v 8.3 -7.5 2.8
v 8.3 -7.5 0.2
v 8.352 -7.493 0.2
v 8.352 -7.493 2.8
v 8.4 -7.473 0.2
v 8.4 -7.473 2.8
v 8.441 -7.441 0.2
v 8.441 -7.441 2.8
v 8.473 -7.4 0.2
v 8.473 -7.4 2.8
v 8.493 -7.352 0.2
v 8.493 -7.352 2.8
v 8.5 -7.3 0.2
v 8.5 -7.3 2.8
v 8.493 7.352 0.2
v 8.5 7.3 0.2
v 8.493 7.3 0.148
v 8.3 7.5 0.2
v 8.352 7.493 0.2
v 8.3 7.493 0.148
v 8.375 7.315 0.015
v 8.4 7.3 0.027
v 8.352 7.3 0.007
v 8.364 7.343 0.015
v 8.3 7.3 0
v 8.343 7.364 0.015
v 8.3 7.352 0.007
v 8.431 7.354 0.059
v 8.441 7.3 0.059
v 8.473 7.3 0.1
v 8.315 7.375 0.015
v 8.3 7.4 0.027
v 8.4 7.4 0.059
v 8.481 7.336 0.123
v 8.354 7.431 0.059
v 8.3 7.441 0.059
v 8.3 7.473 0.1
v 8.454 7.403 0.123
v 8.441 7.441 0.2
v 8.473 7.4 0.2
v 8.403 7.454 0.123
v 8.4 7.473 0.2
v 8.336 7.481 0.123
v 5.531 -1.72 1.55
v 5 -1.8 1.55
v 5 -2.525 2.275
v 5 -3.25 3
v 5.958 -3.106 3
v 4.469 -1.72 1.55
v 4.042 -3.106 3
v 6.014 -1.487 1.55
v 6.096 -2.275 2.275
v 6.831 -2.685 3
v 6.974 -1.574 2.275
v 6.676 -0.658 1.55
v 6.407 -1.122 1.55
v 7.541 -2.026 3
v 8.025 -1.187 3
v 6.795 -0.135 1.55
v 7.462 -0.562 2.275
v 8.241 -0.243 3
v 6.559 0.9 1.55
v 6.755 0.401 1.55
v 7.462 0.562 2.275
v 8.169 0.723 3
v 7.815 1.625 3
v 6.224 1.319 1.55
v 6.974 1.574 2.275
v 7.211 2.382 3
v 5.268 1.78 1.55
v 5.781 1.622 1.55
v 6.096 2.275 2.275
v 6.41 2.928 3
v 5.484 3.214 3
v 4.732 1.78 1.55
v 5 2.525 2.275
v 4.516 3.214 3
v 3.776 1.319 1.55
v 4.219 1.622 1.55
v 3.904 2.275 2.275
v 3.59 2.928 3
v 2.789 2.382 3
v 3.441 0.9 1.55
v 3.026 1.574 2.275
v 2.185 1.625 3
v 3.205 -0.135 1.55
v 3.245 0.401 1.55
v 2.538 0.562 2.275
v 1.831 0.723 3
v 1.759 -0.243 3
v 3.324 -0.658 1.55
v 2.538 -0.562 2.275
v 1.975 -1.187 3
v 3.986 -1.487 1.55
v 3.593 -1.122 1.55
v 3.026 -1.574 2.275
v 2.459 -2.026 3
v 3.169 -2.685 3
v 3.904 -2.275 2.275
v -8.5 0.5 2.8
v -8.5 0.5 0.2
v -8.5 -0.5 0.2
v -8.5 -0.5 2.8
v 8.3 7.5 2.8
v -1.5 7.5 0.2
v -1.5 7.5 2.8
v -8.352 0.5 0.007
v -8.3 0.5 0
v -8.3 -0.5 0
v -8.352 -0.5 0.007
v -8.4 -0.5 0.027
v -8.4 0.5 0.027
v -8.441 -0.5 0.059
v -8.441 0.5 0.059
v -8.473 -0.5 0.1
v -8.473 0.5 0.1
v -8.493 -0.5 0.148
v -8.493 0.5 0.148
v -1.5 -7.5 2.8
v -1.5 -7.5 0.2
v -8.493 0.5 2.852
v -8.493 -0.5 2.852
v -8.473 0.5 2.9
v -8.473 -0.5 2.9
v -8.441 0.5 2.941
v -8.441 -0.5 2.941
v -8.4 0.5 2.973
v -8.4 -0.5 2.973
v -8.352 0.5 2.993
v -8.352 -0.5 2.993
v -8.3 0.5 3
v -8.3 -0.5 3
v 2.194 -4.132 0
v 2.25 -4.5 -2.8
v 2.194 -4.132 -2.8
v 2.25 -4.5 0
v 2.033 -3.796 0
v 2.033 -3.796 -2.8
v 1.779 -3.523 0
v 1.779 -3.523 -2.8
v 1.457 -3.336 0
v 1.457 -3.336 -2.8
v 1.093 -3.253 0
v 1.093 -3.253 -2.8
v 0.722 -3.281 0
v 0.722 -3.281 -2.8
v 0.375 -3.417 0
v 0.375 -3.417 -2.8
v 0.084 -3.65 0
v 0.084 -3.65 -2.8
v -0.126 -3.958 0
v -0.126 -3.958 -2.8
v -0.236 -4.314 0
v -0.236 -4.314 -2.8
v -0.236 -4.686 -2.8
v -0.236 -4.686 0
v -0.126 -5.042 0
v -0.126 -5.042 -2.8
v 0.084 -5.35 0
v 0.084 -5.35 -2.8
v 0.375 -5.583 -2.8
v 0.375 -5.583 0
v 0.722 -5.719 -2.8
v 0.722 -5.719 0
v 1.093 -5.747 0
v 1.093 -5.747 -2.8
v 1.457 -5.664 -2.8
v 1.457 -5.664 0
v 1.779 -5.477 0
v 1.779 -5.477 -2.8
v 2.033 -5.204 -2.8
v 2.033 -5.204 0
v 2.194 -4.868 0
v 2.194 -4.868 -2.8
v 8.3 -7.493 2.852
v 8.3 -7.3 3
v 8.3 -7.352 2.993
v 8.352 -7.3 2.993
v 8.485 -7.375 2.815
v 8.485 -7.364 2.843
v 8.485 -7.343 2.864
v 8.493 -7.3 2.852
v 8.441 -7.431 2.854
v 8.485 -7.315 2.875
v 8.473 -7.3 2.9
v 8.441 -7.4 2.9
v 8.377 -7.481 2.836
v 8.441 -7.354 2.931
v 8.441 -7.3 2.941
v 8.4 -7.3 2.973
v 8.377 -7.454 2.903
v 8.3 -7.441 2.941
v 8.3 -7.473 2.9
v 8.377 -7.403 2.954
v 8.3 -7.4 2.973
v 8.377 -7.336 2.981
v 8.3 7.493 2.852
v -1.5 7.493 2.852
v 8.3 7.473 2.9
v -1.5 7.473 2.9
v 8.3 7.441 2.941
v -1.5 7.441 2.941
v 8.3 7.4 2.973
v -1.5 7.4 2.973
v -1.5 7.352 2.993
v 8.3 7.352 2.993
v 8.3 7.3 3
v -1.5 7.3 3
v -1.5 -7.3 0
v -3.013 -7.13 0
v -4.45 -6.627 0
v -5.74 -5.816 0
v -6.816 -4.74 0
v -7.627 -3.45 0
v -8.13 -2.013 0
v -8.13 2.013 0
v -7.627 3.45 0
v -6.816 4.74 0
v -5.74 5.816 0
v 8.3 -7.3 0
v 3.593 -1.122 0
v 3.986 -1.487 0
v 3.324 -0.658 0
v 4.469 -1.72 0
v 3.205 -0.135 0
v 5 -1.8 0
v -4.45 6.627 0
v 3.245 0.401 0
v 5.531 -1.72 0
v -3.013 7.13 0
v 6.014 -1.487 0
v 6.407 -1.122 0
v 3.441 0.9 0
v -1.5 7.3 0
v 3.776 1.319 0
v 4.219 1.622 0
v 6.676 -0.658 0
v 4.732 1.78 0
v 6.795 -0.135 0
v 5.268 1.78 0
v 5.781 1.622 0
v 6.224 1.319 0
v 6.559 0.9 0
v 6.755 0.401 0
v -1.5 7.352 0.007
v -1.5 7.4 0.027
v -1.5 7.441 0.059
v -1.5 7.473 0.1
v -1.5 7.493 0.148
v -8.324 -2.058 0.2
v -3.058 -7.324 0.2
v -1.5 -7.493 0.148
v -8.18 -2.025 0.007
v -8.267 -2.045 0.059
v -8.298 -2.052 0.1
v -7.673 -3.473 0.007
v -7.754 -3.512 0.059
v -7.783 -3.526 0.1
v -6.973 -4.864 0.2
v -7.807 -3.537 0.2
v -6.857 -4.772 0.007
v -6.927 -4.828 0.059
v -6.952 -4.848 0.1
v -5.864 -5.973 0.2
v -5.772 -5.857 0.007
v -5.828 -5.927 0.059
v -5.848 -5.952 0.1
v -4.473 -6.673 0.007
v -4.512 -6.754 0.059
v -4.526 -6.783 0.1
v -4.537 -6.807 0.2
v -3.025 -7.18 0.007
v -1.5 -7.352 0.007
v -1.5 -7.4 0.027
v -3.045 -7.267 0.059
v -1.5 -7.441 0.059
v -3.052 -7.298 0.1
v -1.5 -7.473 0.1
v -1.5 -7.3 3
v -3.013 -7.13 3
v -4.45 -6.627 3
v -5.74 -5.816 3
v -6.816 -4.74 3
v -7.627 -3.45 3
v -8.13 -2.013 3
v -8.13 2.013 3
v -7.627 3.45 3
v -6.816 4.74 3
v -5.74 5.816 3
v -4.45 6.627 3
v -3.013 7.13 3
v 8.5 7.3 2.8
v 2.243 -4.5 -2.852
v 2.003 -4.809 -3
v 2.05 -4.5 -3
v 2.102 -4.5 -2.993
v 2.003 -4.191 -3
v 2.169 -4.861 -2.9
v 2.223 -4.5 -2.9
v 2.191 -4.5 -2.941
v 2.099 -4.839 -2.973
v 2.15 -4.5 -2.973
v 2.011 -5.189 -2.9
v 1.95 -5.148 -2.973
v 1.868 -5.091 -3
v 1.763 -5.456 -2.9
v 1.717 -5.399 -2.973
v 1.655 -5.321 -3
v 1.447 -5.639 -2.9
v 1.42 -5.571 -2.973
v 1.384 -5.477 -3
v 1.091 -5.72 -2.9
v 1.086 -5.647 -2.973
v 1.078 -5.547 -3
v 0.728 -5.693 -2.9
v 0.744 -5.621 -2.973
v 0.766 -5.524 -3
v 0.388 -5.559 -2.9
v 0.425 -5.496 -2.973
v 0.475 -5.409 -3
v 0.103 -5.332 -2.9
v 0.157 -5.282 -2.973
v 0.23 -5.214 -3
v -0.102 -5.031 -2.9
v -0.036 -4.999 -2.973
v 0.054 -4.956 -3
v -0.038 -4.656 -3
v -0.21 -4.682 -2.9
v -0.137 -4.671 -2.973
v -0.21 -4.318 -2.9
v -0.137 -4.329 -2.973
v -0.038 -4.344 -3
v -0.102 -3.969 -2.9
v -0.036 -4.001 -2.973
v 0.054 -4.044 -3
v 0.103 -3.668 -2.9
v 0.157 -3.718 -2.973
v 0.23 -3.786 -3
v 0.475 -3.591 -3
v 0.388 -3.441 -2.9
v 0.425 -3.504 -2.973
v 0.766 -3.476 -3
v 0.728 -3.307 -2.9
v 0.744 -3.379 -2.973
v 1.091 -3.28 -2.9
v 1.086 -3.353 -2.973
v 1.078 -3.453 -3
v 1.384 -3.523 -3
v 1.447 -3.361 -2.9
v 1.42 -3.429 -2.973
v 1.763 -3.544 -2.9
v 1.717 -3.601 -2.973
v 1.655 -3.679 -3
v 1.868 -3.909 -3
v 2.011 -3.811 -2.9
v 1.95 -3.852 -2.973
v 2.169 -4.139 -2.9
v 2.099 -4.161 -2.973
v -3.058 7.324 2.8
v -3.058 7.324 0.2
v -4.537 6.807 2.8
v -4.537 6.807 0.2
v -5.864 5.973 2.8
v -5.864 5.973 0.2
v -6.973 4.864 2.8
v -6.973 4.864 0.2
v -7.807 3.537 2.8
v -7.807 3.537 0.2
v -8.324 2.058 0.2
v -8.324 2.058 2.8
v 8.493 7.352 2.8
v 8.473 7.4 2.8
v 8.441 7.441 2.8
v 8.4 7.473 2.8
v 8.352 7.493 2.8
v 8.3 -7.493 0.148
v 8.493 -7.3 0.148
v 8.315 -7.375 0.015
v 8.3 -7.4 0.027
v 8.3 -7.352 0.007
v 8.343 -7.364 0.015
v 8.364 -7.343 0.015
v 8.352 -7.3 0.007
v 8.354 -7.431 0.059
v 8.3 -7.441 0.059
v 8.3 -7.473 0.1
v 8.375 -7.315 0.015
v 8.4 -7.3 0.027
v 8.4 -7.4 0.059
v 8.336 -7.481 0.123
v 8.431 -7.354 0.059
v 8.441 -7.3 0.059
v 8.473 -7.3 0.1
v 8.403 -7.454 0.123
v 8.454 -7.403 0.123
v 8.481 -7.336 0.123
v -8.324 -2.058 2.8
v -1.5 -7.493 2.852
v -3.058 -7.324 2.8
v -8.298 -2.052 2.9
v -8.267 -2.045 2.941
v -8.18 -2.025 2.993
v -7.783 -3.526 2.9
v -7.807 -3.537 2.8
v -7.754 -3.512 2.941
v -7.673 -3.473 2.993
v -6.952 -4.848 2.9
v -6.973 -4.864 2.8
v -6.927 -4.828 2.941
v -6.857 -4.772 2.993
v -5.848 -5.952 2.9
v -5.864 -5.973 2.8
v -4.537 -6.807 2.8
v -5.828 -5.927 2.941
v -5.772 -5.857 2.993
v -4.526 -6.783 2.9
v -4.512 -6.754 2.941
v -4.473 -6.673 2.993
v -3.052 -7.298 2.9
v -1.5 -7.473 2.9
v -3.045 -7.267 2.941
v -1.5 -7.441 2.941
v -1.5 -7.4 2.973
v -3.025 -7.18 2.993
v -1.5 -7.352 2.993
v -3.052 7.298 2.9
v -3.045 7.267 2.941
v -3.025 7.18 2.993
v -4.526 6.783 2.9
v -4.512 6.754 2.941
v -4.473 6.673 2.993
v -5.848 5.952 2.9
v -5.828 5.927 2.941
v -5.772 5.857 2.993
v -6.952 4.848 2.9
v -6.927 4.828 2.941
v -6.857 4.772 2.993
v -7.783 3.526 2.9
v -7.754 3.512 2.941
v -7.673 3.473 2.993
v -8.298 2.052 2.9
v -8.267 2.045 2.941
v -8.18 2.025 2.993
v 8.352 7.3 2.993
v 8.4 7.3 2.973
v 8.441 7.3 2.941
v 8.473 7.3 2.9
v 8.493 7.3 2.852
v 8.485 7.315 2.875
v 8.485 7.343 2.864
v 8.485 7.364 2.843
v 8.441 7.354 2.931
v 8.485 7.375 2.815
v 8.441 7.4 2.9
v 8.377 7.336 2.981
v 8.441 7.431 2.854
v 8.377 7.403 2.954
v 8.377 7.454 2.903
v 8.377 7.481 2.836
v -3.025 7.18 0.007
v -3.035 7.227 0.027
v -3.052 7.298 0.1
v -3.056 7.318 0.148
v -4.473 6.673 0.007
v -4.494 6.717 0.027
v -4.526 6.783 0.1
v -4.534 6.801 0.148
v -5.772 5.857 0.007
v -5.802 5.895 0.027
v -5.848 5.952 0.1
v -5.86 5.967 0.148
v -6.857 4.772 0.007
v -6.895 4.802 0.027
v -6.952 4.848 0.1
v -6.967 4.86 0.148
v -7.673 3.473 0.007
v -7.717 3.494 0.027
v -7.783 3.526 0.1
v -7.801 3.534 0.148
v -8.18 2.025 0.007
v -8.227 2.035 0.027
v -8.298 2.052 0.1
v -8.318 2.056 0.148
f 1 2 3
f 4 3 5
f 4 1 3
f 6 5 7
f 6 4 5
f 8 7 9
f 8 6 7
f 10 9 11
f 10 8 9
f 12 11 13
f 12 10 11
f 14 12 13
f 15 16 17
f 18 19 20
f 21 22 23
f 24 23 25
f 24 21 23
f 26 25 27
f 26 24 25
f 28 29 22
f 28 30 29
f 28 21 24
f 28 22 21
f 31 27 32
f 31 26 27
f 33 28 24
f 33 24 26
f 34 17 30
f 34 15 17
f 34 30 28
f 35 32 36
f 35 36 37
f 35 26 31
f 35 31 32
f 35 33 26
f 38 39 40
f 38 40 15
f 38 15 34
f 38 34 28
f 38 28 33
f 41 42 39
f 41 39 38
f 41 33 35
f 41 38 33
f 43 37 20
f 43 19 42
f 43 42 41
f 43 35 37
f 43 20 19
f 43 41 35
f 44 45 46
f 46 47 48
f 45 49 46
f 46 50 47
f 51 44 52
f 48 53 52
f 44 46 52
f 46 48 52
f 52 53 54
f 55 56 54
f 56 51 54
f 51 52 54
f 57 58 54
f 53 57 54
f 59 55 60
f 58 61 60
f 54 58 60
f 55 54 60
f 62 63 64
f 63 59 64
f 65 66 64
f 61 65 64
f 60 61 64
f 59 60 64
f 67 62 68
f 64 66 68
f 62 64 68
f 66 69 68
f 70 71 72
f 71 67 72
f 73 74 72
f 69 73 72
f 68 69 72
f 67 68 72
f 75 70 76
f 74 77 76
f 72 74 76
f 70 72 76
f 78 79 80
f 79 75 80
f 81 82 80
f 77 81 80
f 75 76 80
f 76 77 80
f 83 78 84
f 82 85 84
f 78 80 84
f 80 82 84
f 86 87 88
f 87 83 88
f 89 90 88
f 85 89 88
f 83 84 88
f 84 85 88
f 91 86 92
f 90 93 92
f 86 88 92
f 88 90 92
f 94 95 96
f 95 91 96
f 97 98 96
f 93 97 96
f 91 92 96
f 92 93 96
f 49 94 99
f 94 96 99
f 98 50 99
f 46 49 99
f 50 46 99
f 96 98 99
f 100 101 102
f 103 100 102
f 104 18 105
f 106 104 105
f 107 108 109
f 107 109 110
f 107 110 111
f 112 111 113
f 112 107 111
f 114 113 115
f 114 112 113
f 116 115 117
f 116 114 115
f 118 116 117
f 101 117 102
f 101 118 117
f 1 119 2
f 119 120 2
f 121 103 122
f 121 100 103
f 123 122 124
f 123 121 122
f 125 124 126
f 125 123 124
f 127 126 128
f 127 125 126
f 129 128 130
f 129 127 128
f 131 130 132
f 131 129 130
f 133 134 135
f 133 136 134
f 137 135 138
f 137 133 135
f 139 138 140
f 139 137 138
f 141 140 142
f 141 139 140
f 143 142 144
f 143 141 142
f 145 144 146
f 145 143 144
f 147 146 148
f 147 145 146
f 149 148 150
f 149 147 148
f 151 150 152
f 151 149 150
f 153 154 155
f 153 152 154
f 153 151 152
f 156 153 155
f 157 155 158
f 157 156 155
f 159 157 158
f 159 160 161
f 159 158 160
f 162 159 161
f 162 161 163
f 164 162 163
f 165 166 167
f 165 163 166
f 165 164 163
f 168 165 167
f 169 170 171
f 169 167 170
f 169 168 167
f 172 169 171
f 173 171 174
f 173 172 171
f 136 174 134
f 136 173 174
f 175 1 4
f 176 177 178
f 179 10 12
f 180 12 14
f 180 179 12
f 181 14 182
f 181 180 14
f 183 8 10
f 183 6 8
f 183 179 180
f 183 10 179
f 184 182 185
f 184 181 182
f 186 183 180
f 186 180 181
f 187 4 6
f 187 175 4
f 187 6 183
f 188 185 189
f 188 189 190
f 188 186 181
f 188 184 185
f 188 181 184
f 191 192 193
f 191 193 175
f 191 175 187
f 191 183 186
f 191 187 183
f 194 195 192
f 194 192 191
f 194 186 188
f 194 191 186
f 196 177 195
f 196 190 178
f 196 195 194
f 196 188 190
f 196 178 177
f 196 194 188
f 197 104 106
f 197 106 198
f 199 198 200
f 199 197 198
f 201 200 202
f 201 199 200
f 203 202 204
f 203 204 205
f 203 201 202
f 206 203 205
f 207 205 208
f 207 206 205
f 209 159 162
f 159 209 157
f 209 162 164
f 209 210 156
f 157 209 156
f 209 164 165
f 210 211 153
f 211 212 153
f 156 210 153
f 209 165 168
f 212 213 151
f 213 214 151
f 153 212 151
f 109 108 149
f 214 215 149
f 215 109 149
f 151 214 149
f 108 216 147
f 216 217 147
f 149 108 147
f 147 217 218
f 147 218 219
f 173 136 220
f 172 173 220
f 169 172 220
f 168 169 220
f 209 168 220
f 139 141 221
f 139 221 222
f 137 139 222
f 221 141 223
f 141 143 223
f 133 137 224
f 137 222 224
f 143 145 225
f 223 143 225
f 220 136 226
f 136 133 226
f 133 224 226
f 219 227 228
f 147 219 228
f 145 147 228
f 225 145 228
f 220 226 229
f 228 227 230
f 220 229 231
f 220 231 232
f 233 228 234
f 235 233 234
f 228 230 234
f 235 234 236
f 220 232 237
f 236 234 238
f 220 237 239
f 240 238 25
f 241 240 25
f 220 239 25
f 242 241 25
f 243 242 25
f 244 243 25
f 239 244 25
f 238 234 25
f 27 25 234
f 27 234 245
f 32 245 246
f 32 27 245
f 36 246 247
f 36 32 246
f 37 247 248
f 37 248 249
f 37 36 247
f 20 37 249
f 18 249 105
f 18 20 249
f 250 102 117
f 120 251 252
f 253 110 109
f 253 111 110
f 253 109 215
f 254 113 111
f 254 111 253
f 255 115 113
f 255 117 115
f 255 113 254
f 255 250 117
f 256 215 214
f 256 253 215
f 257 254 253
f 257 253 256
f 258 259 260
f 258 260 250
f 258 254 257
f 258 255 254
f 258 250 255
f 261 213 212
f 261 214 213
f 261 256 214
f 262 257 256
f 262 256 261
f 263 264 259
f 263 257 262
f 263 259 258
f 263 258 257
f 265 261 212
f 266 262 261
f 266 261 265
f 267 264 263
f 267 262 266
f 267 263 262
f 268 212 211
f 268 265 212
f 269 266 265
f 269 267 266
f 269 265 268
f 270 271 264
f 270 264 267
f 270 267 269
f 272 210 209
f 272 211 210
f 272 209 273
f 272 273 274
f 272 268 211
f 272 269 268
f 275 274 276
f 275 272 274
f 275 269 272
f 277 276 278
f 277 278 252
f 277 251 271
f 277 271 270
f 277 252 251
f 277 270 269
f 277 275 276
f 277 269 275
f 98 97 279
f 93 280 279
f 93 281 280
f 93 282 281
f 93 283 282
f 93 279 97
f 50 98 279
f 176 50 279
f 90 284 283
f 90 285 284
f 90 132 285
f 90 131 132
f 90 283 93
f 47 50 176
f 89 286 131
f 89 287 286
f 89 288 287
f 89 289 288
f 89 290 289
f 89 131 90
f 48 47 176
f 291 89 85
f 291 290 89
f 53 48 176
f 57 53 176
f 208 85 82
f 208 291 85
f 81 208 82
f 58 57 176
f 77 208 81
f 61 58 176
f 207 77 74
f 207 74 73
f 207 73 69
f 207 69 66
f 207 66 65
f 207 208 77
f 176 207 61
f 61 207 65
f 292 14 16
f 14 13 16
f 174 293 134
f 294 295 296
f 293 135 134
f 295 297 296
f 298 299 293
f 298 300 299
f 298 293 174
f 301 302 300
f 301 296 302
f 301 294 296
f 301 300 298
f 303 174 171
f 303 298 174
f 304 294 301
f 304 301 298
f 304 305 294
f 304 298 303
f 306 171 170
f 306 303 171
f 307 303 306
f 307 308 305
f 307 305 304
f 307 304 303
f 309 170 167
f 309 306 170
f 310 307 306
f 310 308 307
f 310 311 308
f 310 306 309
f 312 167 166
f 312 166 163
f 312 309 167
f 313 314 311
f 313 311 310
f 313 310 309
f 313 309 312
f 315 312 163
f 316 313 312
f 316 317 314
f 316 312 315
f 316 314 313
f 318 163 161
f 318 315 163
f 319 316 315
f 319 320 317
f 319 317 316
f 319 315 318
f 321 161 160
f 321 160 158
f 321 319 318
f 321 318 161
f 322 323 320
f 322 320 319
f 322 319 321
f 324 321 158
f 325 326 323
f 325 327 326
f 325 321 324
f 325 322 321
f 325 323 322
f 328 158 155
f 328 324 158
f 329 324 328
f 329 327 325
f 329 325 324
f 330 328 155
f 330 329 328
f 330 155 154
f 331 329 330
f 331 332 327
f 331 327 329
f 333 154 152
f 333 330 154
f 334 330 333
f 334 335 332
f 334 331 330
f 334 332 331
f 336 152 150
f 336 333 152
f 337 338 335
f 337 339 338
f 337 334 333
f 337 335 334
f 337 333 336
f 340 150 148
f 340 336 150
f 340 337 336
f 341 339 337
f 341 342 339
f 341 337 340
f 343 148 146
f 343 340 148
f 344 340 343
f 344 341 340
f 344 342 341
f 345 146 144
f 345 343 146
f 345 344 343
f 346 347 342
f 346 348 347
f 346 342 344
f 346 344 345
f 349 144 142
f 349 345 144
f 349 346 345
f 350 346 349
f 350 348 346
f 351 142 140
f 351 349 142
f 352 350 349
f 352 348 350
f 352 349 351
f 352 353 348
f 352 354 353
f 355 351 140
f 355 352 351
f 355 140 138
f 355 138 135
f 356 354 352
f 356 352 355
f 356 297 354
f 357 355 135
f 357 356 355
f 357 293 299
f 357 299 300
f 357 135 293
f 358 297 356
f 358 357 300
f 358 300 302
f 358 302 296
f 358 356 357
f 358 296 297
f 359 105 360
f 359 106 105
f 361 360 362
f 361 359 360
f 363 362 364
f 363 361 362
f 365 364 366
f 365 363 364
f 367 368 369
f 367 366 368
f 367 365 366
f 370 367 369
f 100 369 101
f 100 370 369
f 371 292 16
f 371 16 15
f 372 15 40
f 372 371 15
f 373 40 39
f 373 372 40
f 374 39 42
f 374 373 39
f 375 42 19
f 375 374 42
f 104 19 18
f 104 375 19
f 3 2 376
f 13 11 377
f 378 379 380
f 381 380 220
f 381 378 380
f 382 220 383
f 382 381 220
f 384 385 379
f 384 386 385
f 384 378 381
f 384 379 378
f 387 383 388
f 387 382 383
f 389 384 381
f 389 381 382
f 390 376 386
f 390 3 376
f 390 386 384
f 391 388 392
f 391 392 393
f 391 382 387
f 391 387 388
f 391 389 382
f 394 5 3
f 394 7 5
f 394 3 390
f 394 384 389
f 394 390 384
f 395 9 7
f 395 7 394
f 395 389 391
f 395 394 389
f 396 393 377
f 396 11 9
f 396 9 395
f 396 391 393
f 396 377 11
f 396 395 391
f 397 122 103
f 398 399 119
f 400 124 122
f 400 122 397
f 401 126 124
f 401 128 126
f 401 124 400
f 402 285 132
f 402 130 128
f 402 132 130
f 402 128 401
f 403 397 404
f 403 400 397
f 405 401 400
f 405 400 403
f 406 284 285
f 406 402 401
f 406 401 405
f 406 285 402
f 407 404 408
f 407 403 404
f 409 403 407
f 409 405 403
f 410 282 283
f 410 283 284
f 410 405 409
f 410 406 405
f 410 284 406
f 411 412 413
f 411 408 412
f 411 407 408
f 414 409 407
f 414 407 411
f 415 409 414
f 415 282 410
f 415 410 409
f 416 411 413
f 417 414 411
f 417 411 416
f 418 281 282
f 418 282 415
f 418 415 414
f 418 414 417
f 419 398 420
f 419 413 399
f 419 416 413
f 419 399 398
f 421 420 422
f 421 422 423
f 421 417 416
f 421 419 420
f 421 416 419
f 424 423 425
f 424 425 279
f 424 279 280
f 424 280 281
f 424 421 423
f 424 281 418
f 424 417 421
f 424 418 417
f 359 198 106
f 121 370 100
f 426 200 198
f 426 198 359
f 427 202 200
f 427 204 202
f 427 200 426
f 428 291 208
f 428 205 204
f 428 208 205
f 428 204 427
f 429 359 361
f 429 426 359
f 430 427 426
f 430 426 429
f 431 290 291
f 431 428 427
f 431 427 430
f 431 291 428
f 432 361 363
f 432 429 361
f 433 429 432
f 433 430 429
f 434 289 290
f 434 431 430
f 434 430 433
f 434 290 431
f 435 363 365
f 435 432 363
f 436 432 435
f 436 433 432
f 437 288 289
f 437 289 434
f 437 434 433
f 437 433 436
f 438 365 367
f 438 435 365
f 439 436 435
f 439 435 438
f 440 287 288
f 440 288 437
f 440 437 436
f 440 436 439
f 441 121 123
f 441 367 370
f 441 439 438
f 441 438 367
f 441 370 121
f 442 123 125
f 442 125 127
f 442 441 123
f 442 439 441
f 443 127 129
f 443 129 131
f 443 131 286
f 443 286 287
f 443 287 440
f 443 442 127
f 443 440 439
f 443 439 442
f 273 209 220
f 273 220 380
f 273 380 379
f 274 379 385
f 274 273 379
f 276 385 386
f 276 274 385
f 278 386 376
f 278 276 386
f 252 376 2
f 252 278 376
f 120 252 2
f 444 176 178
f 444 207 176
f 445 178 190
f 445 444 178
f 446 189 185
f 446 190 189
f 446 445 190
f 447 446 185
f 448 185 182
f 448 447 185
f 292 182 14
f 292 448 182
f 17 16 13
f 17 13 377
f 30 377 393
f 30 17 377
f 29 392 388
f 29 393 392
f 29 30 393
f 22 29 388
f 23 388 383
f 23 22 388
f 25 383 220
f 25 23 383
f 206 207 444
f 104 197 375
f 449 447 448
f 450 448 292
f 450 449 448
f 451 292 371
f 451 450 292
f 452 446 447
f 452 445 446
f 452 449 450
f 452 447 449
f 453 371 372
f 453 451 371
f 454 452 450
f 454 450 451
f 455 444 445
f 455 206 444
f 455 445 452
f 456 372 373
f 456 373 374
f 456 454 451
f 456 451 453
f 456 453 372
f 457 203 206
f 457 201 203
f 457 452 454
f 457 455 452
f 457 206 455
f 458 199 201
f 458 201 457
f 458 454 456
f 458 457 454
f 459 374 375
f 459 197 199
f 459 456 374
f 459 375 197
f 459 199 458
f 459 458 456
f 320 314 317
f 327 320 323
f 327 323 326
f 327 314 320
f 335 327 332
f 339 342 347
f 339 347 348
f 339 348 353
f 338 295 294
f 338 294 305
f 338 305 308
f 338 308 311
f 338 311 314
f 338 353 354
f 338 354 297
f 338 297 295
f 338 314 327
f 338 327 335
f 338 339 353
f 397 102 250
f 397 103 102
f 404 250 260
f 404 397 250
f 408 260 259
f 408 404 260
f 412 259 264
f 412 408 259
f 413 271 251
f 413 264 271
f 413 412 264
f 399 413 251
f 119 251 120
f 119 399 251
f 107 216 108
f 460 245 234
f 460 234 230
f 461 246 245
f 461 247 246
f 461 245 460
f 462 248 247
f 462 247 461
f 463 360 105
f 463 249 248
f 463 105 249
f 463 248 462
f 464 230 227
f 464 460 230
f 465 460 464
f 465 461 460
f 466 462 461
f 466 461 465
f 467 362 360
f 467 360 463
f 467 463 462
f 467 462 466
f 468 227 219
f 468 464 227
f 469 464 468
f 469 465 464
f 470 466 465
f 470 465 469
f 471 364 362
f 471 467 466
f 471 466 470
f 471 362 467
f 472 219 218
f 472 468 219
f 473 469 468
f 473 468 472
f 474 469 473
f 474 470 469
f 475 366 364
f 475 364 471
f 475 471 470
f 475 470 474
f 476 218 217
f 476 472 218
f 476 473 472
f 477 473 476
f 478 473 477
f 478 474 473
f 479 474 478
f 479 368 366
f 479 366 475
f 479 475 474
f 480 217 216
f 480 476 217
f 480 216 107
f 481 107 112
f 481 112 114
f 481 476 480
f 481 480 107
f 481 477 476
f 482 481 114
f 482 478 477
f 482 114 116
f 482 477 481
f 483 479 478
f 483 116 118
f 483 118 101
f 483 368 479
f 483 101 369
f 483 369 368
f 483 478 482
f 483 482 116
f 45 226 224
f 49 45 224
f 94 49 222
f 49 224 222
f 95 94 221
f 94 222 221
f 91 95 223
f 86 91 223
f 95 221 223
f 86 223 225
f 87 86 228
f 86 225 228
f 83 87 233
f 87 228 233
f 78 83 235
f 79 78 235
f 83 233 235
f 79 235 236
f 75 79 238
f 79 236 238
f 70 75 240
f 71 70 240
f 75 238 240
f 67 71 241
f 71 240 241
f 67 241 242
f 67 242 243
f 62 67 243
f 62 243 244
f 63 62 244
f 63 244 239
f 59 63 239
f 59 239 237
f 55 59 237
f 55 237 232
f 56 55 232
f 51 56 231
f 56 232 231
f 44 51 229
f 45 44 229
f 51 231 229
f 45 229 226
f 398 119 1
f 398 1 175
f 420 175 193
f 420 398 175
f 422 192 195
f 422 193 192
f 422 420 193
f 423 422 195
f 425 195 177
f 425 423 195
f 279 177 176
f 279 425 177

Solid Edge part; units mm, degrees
sketch "Sketch1" plane through (0, 0, 0) normal (0, 0, 1) x (1, 0, 0)
  line L0 (-8.5, -7.5) -> (8.5, -7.5)
  line L1 (8.5, -7.5) -> (8.5, 7.5)
  line L2 (8.5, 7.5) -> (-8.5, 7.5)
  line L3 (-8.5, 7.5) -> (-8.5, -7.5)
  dimension "D1" = 17
  dimension "D2" = 15
extrude "Protrusion1" add sketch "Sketch1" along normal blind 3
fillet "Verrundung_1" radius 7 2 edges at (-8.5, -7.5, 1.5) (-8.5, 7.5, 1.5)
hole "Bohrung_1" at (5, 0, 3) direction (0, 0, -1) diameter 3.6 depth 3 countersink diameter 6.5 countersink angle 90
sketch "Sketch2" plane through (0, 0, 0) normal (0, 0, -1) x (1, 0, 0)
  circle A0 centre (1, 4.5) radius 1.25
  dimension "D1" = 2.5
  dimension "D2" = 4
  dimension "D3" = 12
extrude "v_3" add sketch "Sketch2" along normal blind 3
fillet "Verrundung_2" radius 0.2 1 edges at (-0.25, -4.5, -3)
fillet "Verrundung_3" radius 0.2 14 edges at (-6.4497, -5.4497, 3) (3.5, -7.5, 3) (-8.5, 0, 3) (-6.4497, 5.4497, 3) (3.5, 7.5, 3) (8.5, 0, 3) (8.5, -7.5, 1.5) (8.5, 7.5, 1.5) (-6.4497, -5.4497, 0) (-8.5, 0, 0) (-6.4497, 5.4497, 0) (3.5, 7.5, 0) (3.5, -7.5, 0) (8.5, 0, 0)
